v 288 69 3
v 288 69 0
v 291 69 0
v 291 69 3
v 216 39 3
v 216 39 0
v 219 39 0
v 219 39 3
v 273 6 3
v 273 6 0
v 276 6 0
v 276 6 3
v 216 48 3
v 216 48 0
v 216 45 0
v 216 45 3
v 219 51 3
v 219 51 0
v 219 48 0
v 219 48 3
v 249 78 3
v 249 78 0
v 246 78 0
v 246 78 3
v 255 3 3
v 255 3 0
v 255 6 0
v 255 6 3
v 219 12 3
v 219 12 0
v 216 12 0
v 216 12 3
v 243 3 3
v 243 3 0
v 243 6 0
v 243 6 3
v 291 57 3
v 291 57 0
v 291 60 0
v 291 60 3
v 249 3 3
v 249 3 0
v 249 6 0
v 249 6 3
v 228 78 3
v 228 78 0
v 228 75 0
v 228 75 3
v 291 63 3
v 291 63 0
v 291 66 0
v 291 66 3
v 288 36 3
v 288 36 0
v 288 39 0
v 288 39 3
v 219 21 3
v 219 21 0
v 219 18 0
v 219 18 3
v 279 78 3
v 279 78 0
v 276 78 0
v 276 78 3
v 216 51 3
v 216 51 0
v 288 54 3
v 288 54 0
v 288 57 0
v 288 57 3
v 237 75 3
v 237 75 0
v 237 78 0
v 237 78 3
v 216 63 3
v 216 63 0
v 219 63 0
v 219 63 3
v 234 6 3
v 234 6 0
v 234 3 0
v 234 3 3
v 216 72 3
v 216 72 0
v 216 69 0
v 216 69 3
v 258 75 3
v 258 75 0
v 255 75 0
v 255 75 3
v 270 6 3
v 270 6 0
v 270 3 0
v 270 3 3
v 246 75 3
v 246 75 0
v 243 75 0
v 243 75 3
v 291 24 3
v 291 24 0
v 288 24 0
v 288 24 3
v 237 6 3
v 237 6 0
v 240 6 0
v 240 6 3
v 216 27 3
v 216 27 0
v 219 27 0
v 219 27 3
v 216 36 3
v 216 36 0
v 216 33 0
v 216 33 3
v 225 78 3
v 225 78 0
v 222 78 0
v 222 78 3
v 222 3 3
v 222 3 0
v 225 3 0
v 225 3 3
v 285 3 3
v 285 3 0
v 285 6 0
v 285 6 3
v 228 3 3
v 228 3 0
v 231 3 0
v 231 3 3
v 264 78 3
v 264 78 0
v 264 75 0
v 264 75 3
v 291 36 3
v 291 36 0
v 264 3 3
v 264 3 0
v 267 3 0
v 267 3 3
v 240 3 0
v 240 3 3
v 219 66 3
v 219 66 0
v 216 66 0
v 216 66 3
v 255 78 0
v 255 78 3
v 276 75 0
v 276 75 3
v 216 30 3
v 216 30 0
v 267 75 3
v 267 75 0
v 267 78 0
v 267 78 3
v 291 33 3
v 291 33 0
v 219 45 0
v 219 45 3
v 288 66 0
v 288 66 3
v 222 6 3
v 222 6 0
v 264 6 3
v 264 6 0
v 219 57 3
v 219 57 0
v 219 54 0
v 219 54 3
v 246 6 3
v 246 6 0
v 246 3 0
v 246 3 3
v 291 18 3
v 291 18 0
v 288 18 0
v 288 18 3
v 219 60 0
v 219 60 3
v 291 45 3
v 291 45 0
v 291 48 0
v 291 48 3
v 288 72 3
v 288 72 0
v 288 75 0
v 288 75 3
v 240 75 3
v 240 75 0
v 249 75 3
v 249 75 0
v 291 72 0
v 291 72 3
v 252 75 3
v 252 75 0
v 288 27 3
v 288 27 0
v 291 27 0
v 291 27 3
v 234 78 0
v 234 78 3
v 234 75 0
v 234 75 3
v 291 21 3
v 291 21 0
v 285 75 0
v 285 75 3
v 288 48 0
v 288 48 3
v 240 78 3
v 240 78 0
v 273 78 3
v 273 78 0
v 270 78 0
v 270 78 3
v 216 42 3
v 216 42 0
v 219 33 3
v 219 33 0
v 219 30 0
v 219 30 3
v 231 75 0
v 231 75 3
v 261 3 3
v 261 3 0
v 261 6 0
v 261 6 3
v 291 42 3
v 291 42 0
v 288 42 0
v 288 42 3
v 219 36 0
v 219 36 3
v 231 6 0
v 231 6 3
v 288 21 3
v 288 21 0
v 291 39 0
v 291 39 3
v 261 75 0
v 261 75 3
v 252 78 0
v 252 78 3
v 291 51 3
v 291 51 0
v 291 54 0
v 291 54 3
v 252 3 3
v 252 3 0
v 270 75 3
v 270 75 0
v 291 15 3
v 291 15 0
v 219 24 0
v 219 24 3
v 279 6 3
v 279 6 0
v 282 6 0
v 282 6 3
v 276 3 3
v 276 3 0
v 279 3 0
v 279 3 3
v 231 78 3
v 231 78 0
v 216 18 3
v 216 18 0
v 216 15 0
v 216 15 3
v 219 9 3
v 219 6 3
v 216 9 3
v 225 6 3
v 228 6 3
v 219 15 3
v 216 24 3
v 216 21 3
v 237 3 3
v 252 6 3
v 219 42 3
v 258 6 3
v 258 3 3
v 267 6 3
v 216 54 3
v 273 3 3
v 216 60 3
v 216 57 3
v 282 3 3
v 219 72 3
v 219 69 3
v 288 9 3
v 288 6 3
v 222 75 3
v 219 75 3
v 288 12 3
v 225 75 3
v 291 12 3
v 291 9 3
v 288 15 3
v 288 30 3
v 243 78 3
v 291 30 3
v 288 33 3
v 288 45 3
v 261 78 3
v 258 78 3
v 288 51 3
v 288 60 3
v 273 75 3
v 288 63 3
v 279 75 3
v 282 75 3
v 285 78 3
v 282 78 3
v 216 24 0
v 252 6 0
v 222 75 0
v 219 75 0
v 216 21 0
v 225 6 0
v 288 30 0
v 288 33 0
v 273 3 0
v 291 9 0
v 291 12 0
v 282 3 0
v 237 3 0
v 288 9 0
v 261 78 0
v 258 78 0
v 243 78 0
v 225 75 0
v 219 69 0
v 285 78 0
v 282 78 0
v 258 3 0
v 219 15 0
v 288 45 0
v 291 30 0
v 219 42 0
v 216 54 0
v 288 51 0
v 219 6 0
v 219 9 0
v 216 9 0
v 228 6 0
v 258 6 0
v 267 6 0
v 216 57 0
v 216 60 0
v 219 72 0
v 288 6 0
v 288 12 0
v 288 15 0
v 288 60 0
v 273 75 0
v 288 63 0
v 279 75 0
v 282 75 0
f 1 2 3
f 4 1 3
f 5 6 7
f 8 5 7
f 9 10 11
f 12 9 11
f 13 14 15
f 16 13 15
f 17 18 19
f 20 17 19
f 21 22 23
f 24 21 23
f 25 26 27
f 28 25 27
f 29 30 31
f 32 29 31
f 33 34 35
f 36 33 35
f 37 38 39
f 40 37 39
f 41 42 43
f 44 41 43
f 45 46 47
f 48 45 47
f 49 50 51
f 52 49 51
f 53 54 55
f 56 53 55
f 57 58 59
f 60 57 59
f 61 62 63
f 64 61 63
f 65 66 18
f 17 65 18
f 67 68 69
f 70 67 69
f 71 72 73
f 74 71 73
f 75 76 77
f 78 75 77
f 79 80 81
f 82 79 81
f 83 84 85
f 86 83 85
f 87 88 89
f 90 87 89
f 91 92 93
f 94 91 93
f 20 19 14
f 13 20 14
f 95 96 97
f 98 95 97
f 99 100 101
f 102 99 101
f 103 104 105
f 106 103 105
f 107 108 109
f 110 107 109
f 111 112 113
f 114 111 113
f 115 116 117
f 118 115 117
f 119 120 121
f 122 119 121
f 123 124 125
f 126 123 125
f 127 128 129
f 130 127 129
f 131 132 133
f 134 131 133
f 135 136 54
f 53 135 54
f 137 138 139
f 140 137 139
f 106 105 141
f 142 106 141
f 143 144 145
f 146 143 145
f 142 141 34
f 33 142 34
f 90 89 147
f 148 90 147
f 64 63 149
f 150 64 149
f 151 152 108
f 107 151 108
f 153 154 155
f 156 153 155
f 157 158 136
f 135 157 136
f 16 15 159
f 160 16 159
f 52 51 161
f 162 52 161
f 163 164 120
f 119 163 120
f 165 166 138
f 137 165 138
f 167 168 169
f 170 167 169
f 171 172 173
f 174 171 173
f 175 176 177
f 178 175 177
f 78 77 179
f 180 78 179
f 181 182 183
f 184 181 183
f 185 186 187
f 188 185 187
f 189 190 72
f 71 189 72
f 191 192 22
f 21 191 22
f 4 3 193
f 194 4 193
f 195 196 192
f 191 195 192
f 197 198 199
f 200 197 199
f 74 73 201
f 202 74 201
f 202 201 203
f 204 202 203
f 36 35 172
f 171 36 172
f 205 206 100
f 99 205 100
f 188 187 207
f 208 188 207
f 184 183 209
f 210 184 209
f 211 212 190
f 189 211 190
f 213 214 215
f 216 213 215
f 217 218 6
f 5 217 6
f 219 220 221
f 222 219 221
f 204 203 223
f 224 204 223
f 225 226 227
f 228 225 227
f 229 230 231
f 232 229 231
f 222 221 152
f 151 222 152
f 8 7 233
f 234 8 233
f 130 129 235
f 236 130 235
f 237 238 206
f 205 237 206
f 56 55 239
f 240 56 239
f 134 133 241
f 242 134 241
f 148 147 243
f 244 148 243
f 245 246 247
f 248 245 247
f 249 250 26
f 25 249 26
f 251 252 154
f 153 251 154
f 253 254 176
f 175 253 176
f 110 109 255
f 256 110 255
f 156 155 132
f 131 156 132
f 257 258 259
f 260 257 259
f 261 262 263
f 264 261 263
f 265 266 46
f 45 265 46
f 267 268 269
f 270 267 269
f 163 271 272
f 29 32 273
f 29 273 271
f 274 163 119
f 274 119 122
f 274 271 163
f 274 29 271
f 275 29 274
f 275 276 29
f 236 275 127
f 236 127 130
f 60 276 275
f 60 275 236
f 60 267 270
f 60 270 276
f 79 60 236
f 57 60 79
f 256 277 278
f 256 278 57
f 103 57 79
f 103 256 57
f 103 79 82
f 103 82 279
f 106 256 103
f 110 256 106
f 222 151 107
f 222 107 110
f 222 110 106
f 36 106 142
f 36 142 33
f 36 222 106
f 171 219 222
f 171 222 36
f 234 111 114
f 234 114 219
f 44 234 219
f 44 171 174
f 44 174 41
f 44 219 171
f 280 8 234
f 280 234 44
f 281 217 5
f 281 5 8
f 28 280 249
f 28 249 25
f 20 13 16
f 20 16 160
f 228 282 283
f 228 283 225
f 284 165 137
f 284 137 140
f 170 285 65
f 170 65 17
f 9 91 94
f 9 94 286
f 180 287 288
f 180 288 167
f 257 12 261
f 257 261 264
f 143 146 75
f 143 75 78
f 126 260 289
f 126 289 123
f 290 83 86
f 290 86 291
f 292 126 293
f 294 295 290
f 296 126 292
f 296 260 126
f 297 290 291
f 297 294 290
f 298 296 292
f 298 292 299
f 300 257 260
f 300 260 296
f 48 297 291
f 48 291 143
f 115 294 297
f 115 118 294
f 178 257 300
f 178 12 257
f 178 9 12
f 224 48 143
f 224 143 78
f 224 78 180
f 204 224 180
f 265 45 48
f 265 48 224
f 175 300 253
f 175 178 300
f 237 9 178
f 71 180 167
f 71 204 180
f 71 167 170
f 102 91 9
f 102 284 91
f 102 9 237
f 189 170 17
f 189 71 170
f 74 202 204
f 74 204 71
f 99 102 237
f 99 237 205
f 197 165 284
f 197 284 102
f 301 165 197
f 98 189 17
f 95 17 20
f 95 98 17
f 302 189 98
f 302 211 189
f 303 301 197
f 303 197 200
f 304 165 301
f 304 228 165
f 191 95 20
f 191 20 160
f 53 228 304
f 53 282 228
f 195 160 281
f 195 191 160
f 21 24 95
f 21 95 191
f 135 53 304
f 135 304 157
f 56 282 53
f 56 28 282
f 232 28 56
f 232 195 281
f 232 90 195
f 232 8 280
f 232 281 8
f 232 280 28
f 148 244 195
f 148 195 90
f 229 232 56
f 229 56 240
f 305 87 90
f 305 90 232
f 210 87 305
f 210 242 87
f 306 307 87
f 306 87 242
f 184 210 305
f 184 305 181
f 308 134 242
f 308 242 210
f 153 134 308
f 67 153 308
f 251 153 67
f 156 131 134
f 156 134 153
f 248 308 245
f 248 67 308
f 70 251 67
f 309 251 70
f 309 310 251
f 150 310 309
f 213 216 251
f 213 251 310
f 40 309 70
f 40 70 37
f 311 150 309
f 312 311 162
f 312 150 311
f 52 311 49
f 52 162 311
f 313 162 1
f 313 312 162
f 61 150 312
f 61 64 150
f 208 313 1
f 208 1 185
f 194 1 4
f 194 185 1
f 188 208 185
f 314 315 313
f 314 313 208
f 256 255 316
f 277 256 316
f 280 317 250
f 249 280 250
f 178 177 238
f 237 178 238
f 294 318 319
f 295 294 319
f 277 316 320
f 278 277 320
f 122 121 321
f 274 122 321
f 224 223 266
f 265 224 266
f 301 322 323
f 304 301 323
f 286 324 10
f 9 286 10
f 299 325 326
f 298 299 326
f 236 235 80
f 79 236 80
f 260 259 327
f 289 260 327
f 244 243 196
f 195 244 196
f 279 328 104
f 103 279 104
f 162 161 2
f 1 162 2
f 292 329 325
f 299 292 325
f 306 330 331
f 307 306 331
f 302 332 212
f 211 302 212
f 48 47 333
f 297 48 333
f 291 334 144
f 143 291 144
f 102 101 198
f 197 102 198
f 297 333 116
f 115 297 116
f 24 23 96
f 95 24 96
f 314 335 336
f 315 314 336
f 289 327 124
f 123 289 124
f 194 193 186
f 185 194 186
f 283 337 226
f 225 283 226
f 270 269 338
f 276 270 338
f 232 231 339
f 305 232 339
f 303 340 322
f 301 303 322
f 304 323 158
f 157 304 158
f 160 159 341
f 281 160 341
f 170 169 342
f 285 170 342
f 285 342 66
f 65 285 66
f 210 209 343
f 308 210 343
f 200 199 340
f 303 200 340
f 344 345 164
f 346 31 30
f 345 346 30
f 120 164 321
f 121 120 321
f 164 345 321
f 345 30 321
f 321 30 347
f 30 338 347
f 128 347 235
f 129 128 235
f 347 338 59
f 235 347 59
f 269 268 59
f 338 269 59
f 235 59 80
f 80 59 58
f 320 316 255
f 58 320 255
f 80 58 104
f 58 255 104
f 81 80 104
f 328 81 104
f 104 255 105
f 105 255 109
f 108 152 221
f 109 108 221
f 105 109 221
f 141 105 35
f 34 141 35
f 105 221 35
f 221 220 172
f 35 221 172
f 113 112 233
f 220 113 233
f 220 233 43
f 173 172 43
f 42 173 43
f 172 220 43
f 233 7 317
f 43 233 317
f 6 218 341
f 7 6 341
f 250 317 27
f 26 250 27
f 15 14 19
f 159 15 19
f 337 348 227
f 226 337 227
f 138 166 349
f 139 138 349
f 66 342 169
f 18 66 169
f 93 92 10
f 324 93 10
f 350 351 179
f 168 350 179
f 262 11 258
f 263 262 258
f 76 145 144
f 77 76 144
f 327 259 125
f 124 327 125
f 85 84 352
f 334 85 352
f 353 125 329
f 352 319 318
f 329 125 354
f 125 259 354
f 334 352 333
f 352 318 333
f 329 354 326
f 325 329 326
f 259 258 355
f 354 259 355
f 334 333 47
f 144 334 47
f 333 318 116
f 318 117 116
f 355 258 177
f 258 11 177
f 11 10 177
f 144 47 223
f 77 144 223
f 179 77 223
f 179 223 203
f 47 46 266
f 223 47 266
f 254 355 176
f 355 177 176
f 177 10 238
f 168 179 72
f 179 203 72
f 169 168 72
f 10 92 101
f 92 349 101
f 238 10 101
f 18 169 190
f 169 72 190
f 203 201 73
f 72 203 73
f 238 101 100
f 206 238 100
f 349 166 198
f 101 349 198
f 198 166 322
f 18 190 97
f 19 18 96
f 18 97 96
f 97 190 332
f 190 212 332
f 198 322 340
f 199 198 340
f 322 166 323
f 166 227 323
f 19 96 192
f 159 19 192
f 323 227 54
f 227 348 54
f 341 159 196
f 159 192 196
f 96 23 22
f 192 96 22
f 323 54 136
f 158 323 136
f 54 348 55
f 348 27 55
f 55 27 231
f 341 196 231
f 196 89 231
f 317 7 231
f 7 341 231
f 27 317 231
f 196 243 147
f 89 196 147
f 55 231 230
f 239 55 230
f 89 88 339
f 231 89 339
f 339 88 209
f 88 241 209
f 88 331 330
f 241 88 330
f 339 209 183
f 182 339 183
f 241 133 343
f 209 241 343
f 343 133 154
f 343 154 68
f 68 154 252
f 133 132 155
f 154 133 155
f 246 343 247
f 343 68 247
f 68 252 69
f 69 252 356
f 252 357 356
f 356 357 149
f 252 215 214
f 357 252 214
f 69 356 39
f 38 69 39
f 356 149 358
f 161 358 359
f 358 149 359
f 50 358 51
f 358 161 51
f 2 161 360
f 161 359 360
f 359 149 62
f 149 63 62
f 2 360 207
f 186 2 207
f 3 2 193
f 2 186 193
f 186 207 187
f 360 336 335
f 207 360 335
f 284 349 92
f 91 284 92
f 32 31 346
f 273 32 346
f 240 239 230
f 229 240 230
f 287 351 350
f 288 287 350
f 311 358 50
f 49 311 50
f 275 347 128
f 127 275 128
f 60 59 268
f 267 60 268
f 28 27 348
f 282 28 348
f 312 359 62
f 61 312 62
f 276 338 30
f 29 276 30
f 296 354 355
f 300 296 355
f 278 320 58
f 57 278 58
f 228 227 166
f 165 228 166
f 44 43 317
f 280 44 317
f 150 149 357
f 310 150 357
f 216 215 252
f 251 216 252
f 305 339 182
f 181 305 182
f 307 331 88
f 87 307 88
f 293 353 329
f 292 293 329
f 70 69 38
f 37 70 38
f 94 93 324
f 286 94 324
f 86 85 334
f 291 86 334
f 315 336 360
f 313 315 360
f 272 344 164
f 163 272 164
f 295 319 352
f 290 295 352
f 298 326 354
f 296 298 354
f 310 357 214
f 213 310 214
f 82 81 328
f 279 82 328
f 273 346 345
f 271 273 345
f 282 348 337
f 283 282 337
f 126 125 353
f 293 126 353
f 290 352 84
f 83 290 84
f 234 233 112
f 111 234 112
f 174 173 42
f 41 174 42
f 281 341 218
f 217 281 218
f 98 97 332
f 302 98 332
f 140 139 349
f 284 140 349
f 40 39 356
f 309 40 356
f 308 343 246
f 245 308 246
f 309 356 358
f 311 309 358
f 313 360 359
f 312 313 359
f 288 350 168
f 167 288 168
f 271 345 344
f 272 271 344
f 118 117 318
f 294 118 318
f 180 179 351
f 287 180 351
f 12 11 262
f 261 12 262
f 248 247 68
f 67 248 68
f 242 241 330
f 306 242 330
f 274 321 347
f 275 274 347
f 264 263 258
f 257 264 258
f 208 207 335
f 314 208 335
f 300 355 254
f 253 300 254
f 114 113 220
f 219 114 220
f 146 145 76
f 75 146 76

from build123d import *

# Parameters (mm, degrees)
BOSS_EXTRUDE1_DEPTH = 3


with BuildPart() as part:
    # Sketch1 → Boss-Extrude1 (new body)
    with BuildSketch(Plane.XY):
        Polygon((219, 51), (219, 48), (216, 48), (216, 45), (219, 45), (219, 42), (216, 42), (216, 39), (219, 39), (219, 36), (216, 36), (216, 33), (219, 33), (219, 30), (216, 30), (216, 27), (219, 27), (219, 24), (216, 24), (216, 21), (219, 21), (219, 18), (216, 18), (216, 15), (219, 15), (219, 12), (216, 12), (216, 9), (219, 9), (219, 6), (222, 6), (222, 3), (225, 3), (225, 6), (228, 6), (228, 3), (231, 3), (231, 6), (234, 6), (234, 3), (237, 3), (237, 6), (240, 6), (240, 3), (243, 3), (243, 6), (246, 6), (246, 3), (249, 3), (249, 6), (252, 6), (252, 3), (255, 3), (255, 6), (258, 6), (258, 3), (261, 3), (261, 6), (264, 6), (264, 3), (267, 3), (267, 6), (270, 6), (270, 3), (273, 3), (273, 6), (276, 6), (276, 3), (279, 3), (279, 6), (282, 6), (282, 3), (285, 3), (285, 6), (288, 6), (288, 9), (291, 9), (291, 12), (288, 12), (288, 15), (291, 15), (291, 18), (288, 18), (288, 21), (291, 21), (291, 24), (288, 24), (288, 27), (291, 27), (291, 30), (288, 30), (288, 33), (291, 33), (291, 36), (288, 36), (288, 39), (291, 39), (291, 42), (288, 42), (288, 45), (291, 45), (291, 48), (288, 48), (288, 51), (291, 51), (291, 54), (288, 54), (288, 57), (291, 57), (291, 60), (288, 60), (288, 63), (291, 63), (291, 66), (288, 66), (288, 69), (291, 69), (291, 72), (288, 72), (288, 75), (285, 75), (285, 78), (282, 78), (282, 75), (279, 75), (279, 78), (276, 78), (276, 75), (273, 75), (273, 78), (270, 78), (270, 75), (267, 75), (267, 78), (264, 78), (264, 75), (261, 75), (261, 78), (258, 78), (258, 75), (255, 75), (255, 78), (252, 78), (252, 75), (249, 75), (249, 78), (246, 78), (246, 75), (243, 75), (243, 78), (240, 78), (240, 75), (237, 75), (237, 78), (234, 78), (234, 75), (231, 75), (231, 78), (228, 78), (228, 75), (225, 75), (225, 78), (222, 78), (222, 75), (219, 75), (219, 72), (216, 72), (216, 69), (219, 69), (219, 66), (216, 66), (216, 63), (219, 63), (219, 60), (216, 60), (216, 57), (219, 57), (219, 54), (216, 54), (216, 51), align=None)
    extrude(amount=BOSS_EXTRUDE1_DEPTH)


solid = part.part
